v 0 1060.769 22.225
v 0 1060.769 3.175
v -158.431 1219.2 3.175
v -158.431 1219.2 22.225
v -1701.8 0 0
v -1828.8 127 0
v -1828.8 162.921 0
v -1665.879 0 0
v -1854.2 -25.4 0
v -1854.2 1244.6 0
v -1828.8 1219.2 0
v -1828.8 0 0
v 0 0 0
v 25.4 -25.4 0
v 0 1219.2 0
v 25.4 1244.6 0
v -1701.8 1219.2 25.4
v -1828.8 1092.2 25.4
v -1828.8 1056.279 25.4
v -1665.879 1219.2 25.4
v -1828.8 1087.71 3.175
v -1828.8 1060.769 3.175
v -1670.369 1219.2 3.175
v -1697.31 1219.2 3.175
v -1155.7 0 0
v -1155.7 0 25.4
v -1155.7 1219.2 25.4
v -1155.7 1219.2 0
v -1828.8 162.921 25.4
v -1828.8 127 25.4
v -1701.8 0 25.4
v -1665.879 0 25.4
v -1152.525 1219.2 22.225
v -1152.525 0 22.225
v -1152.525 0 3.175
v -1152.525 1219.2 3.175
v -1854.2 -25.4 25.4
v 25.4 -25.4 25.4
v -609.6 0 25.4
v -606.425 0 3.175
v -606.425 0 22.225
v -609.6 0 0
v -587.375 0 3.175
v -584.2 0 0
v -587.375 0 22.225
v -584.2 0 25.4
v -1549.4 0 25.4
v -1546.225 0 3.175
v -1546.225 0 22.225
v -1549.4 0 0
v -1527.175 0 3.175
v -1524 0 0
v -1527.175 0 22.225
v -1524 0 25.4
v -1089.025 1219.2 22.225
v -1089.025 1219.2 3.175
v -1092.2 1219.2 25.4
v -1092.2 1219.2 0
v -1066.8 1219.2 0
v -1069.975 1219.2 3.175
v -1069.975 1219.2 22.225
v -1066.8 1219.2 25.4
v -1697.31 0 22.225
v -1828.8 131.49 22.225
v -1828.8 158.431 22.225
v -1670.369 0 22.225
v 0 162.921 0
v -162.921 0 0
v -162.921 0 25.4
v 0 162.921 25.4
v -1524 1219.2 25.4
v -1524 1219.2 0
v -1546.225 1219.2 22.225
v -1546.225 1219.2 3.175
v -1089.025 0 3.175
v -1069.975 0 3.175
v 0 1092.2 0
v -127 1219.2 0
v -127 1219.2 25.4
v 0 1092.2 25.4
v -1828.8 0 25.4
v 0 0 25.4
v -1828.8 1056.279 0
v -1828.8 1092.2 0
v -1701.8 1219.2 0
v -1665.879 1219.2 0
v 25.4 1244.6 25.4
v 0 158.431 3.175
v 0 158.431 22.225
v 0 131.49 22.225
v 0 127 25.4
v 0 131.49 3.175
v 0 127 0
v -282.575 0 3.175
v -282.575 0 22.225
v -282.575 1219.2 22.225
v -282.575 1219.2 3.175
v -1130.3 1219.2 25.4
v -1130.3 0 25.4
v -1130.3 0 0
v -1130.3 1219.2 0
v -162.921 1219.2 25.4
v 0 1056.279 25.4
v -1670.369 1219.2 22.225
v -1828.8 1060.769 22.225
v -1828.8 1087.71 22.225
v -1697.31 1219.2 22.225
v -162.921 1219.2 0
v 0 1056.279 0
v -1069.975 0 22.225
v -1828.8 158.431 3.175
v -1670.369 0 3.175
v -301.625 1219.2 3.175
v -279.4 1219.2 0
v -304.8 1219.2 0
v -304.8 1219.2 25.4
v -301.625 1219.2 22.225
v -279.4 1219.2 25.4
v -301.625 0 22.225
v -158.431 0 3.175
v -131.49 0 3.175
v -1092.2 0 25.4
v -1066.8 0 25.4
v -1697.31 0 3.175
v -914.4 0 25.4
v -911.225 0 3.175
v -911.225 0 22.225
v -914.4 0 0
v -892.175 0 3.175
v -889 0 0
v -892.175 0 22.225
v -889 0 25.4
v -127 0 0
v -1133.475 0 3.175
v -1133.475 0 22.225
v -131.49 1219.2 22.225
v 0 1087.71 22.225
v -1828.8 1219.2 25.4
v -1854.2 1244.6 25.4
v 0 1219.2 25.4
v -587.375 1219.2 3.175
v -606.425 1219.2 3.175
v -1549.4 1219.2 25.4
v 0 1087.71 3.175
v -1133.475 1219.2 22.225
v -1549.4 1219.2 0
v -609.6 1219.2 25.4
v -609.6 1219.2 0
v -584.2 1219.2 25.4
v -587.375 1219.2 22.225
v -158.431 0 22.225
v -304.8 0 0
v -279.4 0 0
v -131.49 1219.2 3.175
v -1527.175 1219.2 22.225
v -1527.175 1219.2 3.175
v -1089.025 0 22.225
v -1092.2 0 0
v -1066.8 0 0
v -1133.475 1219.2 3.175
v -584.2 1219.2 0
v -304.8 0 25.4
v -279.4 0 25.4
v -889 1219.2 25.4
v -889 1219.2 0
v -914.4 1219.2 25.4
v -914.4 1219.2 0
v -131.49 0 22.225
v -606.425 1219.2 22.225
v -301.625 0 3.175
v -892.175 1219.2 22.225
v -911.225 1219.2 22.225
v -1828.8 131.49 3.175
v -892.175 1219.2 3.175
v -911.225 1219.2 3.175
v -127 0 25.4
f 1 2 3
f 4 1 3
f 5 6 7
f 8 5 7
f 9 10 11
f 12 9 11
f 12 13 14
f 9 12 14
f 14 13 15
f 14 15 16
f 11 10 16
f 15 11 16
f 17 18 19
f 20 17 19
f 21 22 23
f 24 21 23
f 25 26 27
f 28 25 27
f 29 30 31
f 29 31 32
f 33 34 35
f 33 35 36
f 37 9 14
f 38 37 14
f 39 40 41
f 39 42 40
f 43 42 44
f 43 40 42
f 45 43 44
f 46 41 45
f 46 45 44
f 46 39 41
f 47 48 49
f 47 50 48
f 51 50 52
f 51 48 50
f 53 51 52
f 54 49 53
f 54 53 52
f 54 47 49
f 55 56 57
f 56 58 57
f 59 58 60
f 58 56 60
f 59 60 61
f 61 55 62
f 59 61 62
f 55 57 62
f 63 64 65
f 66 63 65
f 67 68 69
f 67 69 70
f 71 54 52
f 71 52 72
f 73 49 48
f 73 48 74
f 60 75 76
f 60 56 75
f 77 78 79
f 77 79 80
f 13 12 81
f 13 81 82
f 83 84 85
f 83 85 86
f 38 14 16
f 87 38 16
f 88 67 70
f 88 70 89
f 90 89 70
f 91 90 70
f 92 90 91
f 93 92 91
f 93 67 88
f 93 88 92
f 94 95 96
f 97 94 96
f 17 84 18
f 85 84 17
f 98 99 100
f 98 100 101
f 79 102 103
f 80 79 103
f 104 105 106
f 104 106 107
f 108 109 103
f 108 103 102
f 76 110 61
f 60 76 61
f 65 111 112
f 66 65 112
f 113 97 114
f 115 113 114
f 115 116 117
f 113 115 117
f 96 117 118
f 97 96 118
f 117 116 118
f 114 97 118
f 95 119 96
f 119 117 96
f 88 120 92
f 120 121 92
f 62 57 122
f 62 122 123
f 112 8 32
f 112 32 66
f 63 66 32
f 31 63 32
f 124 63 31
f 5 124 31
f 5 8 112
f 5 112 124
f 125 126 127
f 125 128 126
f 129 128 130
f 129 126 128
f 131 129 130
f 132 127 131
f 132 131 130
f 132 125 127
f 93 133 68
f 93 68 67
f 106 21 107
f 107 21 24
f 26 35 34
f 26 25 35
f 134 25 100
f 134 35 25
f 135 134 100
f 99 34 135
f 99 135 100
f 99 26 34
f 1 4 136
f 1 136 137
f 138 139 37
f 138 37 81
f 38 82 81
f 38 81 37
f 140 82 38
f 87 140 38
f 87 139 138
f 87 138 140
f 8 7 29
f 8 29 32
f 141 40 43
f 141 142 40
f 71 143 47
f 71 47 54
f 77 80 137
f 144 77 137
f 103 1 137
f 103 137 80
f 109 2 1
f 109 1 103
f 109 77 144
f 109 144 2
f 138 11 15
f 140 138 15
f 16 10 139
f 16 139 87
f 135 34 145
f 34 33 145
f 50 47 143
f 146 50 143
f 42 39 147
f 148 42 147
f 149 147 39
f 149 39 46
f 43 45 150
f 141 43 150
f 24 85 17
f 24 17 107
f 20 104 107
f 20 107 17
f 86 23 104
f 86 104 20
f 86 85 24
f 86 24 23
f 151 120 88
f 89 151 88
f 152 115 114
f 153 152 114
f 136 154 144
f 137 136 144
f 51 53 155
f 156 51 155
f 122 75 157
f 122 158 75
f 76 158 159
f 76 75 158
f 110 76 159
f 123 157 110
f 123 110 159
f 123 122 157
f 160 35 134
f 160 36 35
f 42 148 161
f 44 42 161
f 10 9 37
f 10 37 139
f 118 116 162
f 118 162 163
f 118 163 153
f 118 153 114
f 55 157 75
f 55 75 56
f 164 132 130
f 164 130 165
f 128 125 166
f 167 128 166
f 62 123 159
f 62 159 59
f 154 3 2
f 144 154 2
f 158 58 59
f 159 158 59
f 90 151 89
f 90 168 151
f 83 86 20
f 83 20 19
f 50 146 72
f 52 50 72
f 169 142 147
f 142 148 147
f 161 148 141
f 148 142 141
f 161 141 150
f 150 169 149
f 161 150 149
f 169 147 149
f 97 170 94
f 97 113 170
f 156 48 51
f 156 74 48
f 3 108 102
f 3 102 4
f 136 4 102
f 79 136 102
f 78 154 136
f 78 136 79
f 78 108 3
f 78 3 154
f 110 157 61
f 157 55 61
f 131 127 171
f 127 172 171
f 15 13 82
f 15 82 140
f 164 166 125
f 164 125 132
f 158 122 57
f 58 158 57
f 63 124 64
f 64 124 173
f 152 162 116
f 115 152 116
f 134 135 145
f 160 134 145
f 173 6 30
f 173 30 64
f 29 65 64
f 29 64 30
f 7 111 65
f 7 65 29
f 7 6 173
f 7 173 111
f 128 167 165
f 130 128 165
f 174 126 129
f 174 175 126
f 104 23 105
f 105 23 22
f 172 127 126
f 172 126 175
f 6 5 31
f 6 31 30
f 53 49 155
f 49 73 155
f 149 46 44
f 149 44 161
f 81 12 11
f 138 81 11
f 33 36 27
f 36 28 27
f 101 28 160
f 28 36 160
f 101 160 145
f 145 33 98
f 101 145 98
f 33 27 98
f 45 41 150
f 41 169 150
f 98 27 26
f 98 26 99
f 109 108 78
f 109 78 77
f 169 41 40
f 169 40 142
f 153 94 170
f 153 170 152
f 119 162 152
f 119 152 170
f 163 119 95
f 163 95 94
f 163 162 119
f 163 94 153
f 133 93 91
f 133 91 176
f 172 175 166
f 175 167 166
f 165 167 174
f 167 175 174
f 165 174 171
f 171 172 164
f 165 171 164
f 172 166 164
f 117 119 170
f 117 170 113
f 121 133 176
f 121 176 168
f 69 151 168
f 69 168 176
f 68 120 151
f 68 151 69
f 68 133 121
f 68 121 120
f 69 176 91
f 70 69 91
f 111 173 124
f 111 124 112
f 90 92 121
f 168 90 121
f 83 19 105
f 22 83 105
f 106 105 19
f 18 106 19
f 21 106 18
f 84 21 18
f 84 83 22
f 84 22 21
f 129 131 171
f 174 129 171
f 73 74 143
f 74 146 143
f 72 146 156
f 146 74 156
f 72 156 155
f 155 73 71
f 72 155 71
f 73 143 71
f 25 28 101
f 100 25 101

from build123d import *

# Parameters (mm, degrees)
F0_W     = 1879.6
F0_H     = 1270
F0_W_2   = 1828.8
F0_H_2   = 1219.2
F1_DEPTH = 25.4
F2_W     = 25.4
F2_H     = 1219.2
F3_DEPTH = 25.4
F5_DEPTH = 25.4
F6_T     = -3.175
F7_T     = -3.175
F8_T     = -3.175
F9_T     = -3.175
F10_T    = -3.175
F10_2_T  = -3.175
F10_3_T  = -3.175
F10_4_T  = -3.175
F10_5_T  = -3.175
F10_6_T  = -3.175


with BuildPart() as f1:
    # F0 (on Top) → F1 (new body)
    with BuildSketch(Plane.XY):
        with Locations((-914.4, 609.6)):
            Rectangle(F0_W, F0_H)
        with Locations((-914.4, 609.6)):
            Rectangle(F0_W_2, F0_H_2, mode=Mode.SUBTRACT)
    extrude(amount=F1_DEPTH)


with BuildPart() as f3:
    # F2 (on face) → F3 (new body)
    with BuildSketch(Plane.XY.offset(25.4)):
        with Locations((-1536.7, 609.6)):
            Rectangle(F2_W, F2_H)
    extrude(amount=-F3_DEPTH)

    # F10#6
    f10_6_openings = [f3.faces().sort_by_distance(p)[0] for p in [
        (-1536.7, 0, 12.7),
        (-1536.7, 1219.2, 12.7),
    ]]
    offset(amount=F10_6_T, openings=f10_6_openings)


with BuildPart() as f3b:
    # F2 (on face) → F3, piece 2 (new body)
    with BuildSketch(Plane.XY.offset(25.4)):
        with Locations((-1143, 609.6)):
            Rectangle(F2_W, F2_H)
    extrude(amount=-F3_DEPTH)

    # F10#5
    f10_5_openings = [f3b.faces().sort_by_distance(p)[0] for p in [
        (-1143, 0, 12.7),
        (-1143, 1219.2, 12.7),
    ]]
    offset(amount=F10_5_T, openings=f10_5_openings)


with BuildPart() as f3c:
    # F2 (on face) → F3, piece 3 (new body)
    with BuildSketch(Plane.XY.offset(25.4)):
        with Locations((-1079.5, 609.6)):
            Rectangle(F2_W, F2_H)
    extrude(amount=-F3_DEPTH)

    # F10#4
    f10_4_openings = [f3c.faces().sort_by_distance(p)[0] for p in [
        (-1079.5, 0, 12.7),
        (-1079.5, 1219.2, 12.7),
    ]]
    offset(amount=F10_4_T, openings=f10_4_openings)


with BuildPart() as f3d:
    # F2 (on face) → F3, piece 4 (new body)
    with BuildSketch(Plane.XY.offset(25.4)):
        with Locations((-901.7, 609.6)):
            Rectangle(F2_W, F2_H)
    extrude(amount=-F3_DEPTH)

    # F10#3
    f10_3_openings = [f3d.faces().sort_by_distance(p)[0] for p in [
        (-901.7, 1219.2, 12.7),
        (-901.7, 0, 12.7),
    ]]
    offset(amount=F10_3_T, openings=f10_3_openings)


with BuildPart() as f3e:
    # F2 (on face) → F3, piece 5 (new body)
    with BuildSketch(Plane.XY.offset(25.4)):
        with Locations((-596.9, 609.6)):
            Rectangle(F2_W, F2_H)
    extrude(amount=-F3_DEPTH)

    # F10#2
    f10_2_openings = [f3e.faces().sort_by_distance(p)[0] for p in [
        (-596.9, 0, 12.7),
        (-596.9, 1219.2, 12.7),
    ]]
    offset(amount=F10_2_T, openings=f10_2_openings)


with BuildPart() as f3f:
    # F2 (on face) → F3, piece 6 (new body)
    with BuildSketch(Plane.XY.offset(25.4)):
        with Locations((-292.1, 609.6)):
            Rectangle(F2_W, F2_H)
    extrude(amount=-F3_DEPTH)

    # F10
    f10_openings = [f3f.faces().sort_by_distance(p)[0] for p in [
        (-292.1, 1219.2, 12.7),
        (-292.1, 0, 12.7),
    ]]
    offset(amount=F10_T, openings=f10_openings)


with BuildPart() as f5:
    # F4 (on face) → F5 (new body)
    with BuildSketch(Plane(origin=(0, 0, 0), x_dir=(1, 0, 0), z_dir=(0, 0, -1))):
        Polygon((-1665.8789755157, 0), (-1701.8, 0), (-1828.8, -127), (-1828.8, -162.9210244843), align=None)
    extrude(amount=-F5_DEPTH)

    # F7
    f7_openings = [f5.faces().sort_by_distance(p)[0] for p in [
        (-1828.8, 144.960512, 12.7),
        (-1683.839488, 0, 12.7),
    ]]
    offset(amount=F7_T, openings=f7_openings, kind=Kind.INTERSECTION)


with BuildPart() as f5b:
    # F4 (on face) → F5, piece 2 (new body)
    with BuildSketch(Plane(origin=(0, 0, 0), x_dir=(1, 0, 0), z_dir=(0, 0, -1))):
        Polygon((-1665.8789755157, -1219.2), (-1828.8, -1056.2789755157), (-1828.8, -1092.2), (-1701.8, -1219.2), align=None)
    extrude(amount=-F5_DEPTH)

    # F6
    f6_openings = [f5b.faces().sort_by_distance(p)[0] for p in [
        (-1828.8, 1074.239488, 12.7),
        (-1683.839488, 1219.2, 12.7),
    ]]
    offset(amount=F6_T, openings=f6_openings, kind=Kind.INTERSECTION)


with BuildPart() as f5c:
    # F4 (on face) → F5, piece 3 (new body)
    with BuildSketch(Plane(origin=(0, 0, 0), x_dir=(1, 0, 0), z_dir=(0, 0, -1))):
        Polygon((0, -1092.2), (0, -1056.2789755157), (-162.9210244843, -1219.2), (-127, -1219.2), align=None)
    extrude(amount=-F5_DEPTH)

    # F9
    f9_openings = [f5c.faces().sort_by_distance(p)[0] for p in [
        (0, 1074.239488, 12.7),
        (-144.960512, 1219.2, 12.7),
    ]]
    offset(amount=F9_T, openings=f9_openings, kind=Kind.INTERSECTION)


with BuildPart() as f5d:
    # F4 (on face) → F5, piece 4 (new body)
    with BuildSketch(Plane(origin=(0, 0, 0), x_dir=(1, 0, 0), z_dir=(0, 0, -1))):
        Polygon((-127, 0), (-162.9210244843, 0), (0, -162.9210244843), (0, -127), align=None)
    extrude(amount=-F5_DEPTH)

    # F8
    f8_openings = [f5d.faces().sort_by_distance(p)[0] for p in [
        (0, 144.960512, 12.7),
        (-144.960512, 0, 12.7),
    ]]
    offset(amount=F8_T, openings=f8_openings, kind=Kind.INTERSECTION)


solid = Compound([f1.part, f3.part, f3b.part, f3c.part, f3d.part, f3e.part, f3f.part, f5.part, f5b.part, f5c.part, f5d.part])
